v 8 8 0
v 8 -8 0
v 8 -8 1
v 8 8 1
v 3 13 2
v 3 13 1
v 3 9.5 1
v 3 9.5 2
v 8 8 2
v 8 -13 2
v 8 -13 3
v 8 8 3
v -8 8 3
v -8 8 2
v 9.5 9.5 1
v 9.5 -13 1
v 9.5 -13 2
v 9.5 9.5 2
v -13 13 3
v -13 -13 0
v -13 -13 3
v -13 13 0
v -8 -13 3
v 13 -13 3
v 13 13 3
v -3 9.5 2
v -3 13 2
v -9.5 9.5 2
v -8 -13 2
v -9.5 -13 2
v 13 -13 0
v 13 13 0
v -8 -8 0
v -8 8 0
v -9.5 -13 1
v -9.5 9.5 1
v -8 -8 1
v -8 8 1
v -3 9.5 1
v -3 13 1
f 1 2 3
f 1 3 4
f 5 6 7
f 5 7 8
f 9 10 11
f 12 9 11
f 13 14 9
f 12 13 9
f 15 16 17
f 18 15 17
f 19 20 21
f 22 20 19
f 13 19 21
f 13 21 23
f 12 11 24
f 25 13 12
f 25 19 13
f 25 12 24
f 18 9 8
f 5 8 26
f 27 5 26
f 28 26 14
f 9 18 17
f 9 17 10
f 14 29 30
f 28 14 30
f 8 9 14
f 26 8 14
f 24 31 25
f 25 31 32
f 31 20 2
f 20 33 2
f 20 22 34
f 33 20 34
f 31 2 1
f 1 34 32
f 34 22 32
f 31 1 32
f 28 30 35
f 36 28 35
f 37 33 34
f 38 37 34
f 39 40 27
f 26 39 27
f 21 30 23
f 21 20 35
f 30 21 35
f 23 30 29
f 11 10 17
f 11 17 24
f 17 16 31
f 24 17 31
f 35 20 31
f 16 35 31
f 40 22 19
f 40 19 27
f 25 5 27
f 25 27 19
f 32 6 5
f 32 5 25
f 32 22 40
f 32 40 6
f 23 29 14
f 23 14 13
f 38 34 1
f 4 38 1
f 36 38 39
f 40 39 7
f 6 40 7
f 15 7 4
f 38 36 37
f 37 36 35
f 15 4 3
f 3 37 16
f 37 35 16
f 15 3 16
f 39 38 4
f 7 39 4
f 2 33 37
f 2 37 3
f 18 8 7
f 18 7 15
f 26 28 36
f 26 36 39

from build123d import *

# Parameters (mm, degrees)
F0_W     = 26
F0_H     = 26
F0_W_2   = 16
F0_H_2   = 16
F1_DEPTH = 3
F3_DEPTH = 22.5
F2_W     = 16
F2_H     = 1
F4_DEPTH = 5
F5_W     = 6
F5_H     = 1
F6_DEPTH = 3.5


with BuildPart() as f1:
    # F0 (on Top) → F1 (new body)
    with BuildSketch(Plane.XY):
        Rectangle(F0_W, F0_H)
        Rectangle(F0_W_2, F0_H_2, mode=Mode.SUBTRACT)
    extrude(amount=F1_DEPTH)

    # F2 (on face) → F3 (cut)
    with BuildSketch(Plane.XZ.offset(13)):
        Polygon((-8, 2), (-9.5, 2), (-9.5, 1), (9.5, 1), (9.5, 2), (8, 2), align=None)
    extrude(amount=-F3_DEPTH, mode=Mode.SUBTRACT)

    # F2 (on face) → F4 (cut, through all)
    with BuildSketch(Plane.XZ.offset(13)):
        with Locations((0, 2.5)):
            Rectangle(F2_W, F2_H)
    extrude(amount=-F4_DEPTH, mode=Mode.SUBTRACT)

    # F5 (on face) → F6 (cut, through all)
    with BuildSketch(Plane(origin=(0, 13, 0), x_dir=(-1, 0, 0), z_dir=(0, 1, 0))):
        with Locations((0, 1.5)):
            Rectangle(F5_W, F5_H)
    extrude(amount=-F6_DEPTH, mode=Mode.SUBTRACT)


solid = f1.part
